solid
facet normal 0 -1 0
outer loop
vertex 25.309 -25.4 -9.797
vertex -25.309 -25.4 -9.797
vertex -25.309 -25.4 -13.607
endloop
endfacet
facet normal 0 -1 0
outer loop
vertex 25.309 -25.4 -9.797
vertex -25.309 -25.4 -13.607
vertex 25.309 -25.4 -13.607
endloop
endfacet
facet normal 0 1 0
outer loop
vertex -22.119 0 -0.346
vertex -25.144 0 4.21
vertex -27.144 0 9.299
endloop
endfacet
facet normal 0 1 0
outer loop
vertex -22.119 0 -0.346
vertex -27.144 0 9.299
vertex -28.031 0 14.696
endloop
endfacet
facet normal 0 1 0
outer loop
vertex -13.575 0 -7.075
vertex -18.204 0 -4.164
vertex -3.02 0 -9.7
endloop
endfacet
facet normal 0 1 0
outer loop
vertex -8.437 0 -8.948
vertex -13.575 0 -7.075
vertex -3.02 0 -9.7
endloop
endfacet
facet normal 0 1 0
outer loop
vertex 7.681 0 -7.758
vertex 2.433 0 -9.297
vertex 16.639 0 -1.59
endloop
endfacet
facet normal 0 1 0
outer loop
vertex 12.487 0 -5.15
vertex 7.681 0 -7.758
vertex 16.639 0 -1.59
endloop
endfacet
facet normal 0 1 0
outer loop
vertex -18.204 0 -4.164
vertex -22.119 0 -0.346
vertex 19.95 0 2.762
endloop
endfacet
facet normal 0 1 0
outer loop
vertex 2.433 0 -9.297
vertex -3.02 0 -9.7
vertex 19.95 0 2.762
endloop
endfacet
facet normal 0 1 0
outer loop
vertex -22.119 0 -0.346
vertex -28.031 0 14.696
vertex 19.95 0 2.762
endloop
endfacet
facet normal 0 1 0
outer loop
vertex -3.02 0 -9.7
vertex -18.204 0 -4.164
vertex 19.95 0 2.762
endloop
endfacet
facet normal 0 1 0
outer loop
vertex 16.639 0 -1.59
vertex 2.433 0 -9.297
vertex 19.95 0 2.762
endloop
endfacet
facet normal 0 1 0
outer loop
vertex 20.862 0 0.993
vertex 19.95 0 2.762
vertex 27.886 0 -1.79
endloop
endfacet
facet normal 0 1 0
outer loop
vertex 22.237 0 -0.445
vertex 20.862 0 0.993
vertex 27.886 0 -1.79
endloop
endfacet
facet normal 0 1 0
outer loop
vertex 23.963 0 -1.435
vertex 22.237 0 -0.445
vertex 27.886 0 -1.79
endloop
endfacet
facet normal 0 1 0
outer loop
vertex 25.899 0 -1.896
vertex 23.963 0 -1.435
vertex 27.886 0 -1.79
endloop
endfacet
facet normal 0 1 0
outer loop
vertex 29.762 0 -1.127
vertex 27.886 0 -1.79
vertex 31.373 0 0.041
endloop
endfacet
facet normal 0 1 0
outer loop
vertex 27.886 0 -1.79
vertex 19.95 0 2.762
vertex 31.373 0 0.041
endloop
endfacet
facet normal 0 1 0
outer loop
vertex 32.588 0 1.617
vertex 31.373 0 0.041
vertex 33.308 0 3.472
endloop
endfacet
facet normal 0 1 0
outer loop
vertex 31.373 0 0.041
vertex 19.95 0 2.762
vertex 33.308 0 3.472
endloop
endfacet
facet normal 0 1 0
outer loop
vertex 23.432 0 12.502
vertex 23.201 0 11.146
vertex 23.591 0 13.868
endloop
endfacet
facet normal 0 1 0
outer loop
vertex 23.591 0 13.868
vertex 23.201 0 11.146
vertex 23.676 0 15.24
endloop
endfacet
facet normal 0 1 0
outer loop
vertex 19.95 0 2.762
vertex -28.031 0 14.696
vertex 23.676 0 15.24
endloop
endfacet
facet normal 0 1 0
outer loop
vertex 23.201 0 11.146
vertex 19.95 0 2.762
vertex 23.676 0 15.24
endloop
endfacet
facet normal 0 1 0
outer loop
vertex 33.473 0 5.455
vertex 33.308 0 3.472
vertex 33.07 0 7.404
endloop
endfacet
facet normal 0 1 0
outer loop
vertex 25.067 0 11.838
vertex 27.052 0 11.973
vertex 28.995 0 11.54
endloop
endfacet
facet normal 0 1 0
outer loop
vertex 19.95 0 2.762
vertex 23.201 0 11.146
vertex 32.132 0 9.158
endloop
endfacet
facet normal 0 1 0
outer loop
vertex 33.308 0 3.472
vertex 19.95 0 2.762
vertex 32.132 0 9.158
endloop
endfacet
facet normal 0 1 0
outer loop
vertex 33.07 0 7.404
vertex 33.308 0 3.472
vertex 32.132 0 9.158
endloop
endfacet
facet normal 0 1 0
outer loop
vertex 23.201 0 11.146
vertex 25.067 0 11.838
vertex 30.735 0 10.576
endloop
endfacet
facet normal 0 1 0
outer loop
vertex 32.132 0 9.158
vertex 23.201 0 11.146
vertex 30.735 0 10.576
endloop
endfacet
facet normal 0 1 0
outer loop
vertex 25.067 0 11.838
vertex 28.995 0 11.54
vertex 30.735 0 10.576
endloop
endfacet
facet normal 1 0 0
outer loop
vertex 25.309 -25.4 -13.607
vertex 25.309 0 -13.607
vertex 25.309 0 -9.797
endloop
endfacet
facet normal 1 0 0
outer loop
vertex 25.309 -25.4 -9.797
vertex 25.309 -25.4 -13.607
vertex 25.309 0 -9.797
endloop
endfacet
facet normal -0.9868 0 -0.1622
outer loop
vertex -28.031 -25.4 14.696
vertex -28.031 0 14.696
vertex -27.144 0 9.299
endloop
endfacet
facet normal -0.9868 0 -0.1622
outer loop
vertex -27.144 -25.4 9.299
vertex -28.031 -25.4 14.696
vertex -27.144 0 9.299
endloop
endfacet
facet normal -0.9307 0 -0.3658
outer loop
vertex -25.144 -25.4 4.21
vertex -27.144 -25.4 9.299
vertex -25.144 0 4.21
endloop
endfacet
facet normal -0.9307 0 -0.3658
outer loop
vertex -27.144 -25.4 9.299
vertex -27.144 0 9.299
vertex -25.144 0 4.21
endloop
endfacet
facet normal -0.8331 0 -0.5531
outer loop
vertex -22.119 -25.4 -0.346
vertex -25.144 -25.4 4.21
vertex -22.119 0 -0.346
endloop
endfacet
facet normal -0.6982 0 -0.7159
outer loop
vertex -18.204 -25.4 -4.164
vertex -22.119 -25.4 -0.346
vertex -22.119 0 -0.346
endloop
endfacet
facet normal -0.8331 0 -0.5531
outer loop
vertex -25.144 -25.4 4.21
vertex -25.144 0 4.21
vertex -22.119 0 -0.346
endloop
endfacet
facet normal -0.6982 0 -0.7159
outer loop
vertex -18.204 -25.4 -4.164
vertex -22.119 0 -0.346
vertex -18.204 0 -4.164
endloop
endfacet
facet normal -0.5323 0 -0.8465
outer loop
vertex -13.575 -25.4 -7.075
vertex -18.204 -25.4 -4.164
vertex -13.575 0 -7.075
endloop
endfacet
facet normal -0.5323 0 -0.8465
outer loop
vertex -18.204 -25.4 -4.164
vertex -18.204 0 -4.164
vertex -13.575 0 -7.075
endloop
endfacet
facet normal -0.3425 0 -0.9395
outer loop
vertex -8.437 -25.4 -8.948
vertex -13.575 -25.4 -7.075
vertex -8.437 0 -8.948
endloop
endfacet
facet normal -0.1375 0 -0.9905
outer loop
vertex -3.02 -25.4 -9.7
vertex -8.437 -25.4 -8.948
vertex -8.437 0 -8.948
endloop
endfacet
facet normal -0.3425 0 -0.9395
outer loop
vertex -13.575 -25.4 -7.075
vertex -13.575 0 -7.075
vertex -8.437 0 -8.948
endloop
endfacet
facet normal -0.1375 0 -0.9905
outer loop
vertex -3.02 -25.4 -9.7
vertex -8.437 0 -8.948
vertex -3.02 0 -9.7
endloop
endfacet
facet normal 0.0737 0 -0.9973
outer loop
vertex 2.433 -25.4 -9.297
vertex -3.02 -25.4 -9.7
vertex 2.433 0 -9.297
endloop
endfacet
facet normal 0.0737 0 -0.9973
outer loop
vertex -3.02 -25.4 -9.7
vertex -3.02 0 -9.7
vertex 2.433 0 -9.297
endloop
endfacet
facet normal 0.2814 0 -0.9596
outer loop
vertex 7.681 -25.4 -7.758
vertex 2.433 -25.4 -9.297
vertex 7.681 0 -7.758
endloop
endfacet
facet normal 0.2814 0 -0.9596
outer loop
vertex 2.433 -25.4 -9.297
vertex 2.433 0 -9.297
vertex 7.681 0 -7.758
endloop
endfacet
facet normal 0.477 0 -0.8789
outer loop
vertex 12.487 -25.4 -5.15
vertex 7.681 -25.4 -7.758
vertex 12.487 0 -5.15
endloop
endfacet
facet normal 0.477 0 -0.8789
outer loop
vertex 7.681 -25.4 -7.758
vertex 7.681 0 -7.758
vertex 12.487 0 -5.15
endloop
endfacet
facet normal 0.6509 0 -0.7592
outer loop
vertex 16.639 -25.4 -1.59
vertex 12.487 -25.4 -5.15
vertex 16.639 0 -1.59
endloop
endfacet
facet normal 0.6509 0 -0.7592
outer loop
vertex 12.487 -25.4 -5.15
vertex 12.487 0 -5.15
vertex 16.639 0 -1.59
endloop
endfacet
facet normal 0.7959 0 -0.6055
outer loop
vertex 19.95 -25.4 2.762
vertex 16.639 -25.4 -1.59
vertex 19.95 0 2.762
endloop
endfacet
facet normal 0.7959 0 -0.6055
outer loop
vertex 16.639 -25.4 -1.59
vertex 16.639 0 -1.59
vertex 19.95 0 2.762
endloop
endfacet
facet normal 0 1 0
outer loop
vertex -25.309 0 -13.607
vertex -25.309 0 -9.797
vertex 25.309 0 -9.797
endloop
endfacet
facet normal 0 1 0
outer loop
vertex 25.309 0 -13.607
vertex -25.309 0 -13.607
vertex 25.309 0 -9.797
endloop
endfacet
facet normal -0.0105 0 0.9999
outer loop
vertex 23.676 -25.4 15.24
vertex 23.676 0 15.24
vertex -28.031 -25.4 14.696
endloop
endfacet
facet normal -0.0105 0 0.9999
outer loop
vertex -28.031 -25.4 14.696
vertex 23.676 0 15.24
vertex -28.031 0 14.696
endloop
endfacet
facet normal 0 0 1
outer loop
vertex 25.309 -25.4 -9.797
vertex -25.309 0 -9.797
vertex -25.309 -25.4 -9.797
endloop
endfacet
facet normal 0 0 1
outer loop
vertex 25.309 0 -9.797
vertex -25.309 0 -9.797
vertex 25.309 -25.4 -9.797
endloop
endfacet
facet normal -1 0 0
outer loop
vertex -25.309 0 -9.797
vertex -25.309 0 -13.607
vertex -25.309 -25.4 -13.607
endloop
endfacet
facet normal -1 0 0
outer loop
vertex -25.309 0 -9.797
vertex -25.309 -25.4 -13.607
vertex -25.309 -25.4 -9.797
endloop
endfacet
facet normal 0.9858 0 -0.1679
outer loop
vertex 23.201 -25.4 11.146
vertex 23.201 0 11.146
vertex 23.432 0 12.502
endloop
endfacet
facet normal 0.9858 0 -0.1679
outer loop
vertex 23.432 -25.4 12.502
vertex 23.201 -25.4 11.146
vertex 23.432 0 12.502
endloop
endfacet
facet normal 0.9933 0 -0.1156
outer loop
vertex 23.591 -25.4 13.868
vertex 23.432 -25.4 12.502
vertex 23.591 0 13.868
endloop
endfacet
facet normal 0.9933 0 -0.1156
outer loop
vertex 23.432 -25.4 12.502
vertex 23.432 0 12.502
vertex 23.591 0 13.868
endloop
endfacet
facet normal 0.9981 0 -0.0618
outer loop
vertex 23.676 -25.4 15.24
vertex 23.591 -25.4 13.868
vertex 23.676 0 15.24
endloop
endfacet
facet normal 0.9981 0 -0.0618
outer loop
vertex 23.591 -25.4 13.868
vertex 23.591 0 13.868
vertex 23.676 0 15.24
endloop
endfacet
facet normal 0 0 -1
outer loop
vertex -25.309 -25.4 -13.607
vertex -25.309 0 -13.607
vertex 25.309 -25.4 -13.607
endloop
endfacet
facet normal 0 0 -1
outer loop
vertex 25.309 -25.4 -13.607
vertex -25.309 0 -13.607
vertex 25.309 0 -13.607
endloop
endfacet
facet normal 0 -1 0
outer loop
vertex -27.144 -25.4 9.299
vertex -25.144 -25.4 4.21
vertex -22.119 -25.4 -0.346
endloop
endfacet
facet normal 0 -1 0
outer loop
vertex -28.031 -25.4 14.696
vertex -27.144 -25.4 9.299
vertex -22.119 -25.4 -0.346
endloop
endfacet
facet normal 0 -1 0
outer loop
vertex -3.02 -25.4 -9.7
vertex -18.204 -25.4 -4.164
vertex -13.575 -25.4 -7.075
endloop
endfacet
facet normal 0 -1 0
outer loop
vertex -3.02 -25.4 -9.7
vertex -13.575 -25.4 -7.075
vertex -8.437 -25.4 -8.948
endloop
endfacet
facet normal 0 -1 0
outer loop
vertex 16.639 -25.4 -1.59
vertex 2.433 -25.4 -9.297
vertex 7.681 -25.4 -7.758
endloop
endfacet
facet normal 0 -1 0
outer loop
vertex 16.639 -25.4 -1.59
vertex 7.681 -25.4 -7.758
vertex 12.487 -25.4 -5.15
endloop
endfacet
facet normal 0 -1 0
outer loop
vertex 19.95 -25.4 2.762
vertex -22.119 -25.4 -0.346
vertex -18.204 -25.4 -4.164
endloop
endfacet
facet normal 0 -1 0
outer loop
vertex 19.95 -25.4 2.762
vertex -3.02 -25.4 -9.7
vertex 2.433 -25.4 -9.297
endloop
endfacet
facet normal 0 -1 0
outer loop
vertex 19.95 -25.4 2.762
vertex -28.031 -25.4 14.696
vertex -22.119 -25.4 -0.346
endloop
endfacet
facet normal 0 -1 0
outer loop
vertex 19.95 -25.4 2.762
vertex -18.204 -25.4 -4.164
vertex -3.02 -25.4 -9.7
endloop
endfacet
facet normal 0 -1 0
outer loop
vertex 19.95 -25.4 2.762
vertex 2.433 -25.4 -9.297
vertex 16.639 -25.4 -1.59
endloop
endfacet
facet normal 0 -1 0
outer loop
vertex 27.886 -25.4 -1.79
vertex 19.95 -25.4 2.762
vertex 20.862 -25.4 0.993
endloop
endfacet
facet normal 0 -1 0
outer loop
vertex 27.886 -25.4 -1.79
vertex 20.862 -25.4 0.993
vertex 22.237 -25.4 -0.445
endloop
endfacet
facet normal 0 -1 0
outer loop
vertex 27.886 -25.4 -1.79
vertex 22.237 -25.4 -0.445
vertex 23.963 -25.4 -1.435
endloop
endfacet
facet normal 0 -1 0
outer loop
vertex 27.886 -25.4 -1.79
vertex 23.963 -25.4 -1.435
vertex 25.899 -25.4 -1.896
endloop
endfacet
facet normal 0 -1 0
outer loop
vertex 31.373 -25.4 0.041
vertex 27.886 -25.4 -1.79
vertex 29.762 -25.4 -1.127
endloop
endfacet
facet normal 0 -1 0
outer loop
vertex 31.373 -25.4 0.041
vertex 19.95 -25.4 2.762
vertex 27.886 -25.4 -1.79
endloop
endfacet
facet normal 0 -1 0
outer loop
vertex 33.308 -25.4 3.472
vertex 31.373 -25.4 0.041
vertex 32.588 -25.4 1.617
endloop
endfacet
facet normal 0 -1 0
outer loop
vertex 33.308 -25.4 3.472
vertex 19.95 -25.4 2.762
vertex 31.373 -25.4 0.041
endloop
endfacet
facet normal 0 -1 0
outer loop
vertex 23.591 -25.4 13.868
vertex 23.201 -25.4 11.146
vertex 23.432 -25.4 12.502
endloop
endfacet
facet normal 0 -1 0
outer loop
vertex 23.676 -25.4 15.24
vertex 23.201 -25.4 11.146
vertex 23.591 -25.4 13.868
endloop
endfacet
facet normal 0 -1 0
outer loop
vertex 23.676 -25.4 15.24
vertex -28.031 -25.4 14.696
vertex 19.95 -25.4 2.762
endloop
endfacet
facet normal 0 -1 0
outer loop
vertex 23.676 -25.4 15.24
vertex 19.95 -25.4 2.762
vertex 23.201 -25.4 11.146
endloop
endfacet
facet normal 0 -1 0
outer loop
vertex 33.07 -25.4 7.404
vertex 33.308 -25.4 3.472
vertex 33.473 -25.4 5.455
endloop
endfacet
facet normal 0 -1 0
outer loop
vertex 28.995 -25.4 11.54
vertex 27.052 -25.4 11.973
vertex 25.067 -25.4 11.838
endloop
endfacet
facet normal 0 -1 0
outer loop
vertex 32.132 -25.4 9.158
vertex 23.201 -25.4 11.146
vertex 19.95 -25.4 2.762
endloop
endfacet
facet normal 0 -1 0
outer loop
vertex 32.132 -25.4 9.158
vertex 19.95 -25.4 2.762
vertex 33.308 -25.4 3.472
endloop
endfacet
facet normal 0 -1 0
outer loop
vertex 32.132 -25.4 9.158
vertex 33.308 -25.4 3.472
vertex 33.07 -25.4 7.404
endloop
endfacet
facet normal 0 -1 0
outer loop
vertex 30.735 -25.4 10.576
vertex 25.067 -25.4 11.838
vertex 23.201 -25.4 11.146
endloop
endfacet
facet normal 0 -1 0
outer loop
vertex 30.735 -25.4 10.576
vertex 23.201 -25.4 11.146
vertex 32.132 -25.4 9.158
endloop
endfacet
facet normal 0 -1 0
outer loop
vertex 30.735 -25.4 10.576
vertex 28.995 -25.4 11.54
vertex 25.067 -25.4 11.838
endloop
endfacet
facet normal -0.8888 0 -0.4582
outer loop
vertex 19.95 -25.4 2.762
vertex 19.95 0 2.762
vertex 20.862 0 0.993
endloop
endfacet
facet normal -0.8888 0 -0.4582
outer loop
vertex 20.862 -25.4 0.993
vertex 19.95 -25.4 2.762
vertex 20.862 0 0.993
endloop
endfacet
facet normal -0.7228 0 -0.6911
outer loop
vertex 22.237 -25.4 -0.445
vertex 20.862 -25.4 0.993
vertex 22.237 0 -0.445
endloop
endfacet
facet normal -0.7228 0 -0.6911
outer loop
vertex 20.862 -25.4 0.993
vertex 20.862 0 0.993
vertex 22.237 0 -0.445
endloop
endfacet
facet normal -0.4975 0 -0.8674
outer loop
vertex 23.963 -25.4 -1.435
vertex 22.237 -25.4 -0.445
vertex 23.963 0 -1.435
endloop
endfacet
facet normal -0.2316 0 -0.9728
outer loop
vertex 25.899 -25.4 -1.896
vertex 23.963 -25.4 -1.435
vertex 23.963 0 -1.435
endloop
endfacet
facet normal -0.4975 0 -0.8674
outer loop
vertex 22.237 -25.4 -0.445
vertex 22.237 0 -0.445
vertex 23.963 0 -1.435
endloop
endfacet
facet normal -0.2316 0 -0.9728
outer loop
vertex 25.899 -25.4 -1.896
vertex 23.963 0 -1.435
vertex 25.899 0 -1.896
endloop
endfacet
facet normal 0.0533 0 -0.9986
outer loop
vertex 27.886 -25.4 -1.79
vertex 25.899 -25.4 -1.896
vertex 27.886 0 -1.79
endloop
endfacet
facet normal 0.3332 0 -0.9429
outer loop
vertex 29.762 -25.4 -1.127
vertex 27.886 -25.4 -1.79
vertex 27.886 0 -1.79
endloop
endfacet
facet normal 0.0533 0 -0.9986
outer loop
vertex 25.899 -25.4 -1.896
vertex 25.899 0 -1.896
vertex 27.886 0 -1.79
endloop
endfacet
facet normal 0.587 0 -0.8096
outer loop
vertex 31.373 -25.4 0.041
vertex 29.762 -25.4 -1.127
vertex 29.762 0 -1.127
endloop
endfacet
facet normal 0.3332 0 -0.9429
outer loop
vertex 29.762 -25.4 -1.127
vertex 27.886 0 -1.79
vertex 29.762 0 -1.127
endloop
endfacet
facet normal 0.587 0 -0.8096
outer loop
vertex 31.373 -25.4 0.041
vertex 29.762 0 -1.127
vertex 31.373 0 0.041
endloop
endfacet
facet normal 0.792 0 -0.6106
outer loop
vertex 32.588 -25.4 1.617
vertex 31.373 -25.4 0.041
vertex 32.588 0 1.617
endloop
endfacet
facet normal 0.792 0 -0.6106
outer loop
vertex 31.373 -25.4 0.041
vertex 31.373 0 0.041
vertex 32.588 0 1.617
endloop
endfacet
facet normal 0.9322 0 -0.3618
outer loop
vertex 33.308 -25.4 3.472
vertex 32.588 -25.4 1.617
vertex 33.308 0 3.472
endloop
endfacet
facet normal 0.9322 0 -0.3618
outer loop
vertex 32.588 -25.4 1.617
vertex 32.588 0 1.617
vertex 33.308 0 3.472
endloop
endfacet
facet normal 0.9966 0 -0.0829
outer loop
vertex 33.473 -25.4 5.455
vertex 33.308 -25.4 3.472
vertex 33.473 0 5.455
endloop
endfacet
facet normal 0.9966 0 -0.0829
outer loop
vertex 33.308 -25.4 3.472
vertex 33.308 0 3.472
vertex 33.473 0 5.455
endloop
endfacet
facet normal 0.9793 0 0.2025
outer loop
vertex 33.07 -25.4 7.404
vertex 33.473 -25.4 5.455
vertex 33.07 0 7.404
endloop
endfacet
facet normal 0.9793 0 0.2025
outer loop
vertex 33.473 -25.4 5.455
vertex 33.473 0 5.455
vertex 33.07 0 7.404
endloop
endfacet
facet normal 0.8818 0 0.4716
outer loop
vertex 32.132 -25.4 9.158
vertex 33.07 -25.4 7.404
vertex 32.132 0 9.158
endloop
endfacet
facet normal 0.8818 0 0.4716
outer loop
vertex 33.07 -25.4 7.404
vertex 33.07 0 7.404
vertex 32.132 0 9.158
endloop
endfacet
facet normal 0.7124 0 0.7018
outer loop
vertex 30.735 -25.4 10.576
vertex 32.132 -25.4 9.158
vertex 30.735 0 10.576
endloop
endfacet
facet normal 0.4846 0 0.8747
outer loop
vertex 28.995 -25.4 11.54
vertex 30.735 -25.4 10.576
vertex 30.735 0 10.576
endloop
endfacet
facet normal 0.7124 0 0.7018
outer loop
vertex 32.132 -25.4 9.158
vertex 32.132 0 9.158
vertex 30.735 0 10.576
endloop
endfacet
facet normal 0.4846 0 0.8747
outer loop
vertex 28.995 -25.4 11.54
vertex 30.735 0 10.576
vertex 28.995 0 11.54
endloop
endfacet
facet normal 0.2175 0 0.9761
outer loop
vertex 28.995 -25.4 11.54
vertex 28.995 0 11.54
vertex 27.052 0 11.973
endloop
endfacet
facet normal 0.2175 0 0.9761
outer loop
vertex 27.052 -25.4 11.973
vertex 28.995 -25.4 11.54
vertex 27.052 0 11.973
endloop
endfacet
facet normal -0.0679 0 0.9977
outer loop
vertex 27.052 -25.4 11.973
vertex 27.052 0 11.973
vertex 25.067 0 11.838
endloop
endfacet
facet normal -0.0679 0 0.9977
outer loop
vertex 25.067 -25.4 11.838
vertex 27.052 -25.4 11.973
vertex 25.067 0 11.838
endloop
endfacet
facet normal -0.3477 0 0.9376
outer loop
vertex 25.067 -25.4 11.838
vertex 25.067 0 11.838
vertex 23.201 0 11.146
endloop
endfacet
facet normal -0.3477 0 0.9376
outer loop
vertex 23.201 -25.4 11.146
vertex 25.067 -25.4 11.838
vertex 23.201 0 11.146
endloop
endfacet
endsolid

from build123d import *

# Parameters (mm, degrees)
F0_W     = 50.618568
F0_H     = 3.809999
F1_DEPTH = 25.4


with BuildPart() as f1:
    # F0 (on Front) → F1 (new body)
    with BuildSketch(Plane.XZ):
        with BuildLine():
            Line((23.676431, 15.240001), (-28.030714, 14.695714))
            ThreePointArc((-28.030714, 14.695714), (-8.436998, -8.948261), (19.949959, 2.762076))
            ThreePointArc((19.949959, 2.762076), (21.942402, 6.811929), (23.201031, 11.146326))
            ThreePointArc((23.201031, 11.146326), (23.520337, 13.183686), (23.676431, 15.240001))
        make_face()
        with BuildLine():
            ThreePointArc((23.201031, 11.146326), (21.942402, 6.811929), (19.949959, 2.762076))
            ThreePointArc((19.949959, 2.762076), (33.014855, 2.518482), (23.201031, 11.146326))
        make_face()
        with Locations((-1e-06, -11.702143)):
            Rectangle(F0_W, F0_H)
    extrude(amount=F1_DEPTH)


solid = f1.part
